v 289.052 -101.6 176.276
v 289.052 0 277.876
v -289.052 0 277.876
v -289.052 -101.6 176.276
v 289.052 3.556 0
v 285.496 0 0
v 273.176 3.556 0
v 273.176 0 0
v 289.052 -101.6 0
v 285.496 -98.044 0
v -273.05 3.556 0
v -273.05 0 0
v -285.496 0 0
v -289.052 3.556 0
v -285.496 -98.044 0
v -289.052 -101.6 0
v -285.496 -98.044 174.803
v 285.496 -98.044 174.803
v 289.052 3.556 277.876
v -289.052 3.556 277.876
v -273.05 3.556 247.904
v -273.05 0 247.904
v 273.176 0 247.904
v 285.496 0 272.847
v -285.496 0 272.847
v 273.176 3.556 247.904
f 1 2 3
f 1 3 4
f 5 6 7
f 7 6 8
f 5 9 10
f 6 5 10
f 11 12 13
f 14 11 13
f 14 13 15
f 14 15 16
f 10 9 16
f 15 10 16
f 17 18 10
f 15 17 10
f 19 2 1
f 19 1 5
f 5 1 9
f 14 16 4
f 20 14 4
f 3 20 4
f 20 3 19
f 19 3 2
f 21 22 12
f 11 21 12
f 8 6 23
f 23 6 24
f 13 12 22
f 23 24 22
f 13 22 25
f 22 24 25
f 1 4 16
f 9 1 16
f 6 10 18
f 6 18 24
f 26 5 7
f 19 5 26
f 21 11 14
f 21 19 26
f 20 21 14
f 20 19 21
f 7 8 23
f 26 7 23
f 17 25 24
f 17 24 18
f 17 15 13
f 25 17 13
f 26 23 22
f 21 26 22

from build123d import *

# Parameters (mm, degrees)
F1_DEPTH = 289.052
F2_T     = -3.556
F4_DEPTH = 3.556


with BuildPart() as f1:
    # F0 (on Right) → F1 (new body, symmetric)
    with BuildSketch(Plane.YZ):
        Polygon((-101.6, 0), (0, 0), (0, 277.876), (-101.6, 176.276), align=None)
    extrude(amount=F1_DEPTH, both=True)

    # F2
    f2_openings = [f1.faces().sort_by_distance(p)[0] for p in [
        (0, 0, 138.938),
        (0, -50.8, 0),
    ]]
    offset(amount=F2_T, openings=f2_openings)

    # F3 (on face) → F4 (join)
    with BuildSketch(Plane(origin=(0, 0, 0), x_dir=(-1, 0, 0), z_dir=(0, 1, 0))):
        Polygon((289.052, 277.876), (-289.052, 277.876), (-289.052, 0), (-273.175836, 0), (-273.175836, 247.904), (273.05, 247.904), (273.05, 0), (289.052, 0), align=None)
    extrude(amount=F4_DEPTH)


solid = f1.part
